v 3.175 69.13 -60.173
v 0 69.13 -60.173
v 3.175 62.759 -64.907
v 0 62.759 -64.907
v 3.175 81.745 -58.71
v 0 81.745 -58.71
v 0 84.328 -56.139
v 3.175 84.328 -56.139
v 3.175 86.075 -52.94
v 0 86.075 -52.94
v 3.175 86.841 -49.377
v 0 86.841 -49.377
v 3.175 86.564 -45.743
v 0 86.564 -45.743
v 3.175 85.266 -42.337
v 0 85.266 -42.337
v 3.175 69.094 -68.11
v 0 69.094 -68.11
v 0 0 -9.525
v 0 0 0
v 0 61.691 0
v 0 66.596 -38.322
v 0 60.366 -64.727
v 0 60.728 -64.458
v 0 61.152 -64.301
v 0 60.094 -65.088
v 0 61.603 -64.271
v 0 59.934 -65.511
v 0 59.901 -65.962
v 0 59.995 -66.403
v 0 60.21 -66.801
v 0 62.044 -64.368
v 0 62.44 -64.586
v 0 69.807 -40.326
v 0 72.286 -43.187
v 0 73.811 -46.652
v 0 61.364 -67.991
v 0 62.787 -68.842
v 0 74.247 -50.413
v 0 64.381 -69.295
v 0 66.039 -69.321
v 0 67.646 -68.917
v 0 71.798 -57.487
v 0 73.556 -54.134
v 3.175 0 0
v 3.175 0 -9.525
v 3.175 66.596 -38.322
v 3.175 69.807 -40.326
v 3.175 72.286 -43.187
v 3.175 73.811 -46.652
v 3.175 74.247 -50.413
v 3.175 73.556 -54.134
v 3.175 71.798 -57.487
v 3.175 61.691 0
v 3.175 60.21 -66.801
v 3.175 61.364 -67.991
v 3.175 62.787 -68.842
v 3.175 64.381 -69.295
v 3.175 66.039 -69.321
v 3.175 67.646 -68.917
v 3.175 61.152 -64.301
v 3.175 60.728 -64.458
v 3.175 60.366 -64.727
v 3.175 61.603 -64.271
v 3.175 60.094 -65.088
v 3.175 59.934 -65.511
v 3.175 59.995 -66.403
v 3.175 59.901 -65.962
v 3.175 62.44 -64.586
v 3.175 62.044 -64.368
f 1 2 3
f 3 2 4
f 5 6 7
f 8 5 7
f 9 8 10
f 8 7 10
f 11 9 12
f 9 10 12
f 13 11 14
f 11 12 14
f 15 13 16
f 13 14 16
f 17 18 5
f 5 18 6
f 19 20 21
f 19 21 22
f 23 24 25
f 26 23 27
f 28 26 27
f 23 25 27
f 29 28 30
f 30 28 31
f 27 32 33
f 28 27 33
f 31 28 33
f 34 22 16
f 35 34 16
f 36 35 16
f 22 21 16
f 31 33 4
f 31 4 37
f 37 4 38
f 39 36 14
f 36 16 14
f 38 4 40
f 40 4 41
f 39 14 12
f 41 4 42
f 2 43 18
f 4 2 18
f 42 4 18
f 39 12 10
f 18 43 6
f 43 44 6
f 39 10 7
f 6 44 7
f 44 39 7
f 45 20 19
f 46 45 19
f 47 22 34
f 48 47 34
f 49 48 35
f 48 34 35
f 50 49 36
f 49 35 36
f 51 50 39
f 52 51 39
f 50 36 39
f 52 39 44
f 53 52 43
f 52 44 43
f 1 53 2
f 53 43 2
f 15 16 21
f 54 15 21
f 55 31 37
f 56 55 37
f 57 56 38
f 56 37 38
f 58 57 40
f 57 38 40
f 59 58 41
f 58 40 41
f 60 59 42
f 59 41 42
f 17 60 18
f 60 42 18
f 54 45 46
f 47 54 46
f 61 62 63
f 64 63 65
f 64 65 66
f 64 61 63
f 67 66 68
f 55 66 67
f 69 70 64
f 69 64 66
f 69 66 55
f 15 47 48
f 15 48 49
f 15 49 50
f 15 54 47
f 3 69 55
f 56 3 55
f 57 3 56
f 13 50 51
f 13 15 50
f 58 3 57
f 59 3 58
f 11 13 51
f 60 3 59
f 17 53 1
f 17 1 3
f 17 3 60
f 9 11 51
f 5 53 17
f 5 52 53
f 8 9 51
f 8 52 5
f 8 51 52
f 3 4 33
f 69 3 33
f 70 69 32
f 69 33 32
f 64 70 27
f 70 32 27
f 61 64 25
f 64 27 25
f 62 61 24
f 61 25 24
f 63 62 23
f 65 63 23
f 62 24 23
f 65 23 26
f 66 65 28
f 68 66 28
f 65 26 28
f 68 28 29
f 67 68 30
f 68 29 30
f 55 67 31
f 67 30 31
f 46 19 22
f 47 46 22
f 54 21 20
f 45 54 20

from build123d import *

# Parameters (mm, degrees)
BOSS_EXTRUDE1_DEPTH = 3.175


with BuildPart() as part:
    # Sketch1 → Boss-Extrude1 (new body)
    with BuildSketch(Plane(origin=(0, 0, 0), x_dir=(0, 0, -1), z_dir=(1, 0, 0))):
        with BuildLine():
            Line((0, 0), (9.525, 0))
            Line((9.525, 0), (38.322191876, 66.595518378))
            ThreePointArc((38.322191876, 66.595518378), (48.515936948, 74.170316159), (60.17277679, 69.129672857))
            Line((60.17277679, 69.129672857), (64.907025403, 62.758582188))
            ThreePointArc((64.907025403, 62.758582188), (64.579656991, 60.537514331), (66.800724848, 60.21014592))
            ThreePointArc((66.800724848, 60.21014592), (69.295454529, 64.381080761), (68.110198493, 69.094417346))
            Line((68.110198493, 69.094417346), (58.709682019, 81.745113939))
            ThreePointArc((58.709682019, 81.745113939), (51.186125331, 86.5864385), (42.337451795, 85.266095591))
            Line((42.337451795, 85.266095591), (0, 61.691247253))
            Line((0, 61.691247253), (0, 0))
        make_face()
    extrude(amount=BOSS_EXTRUDE1_DEPTH)


solid = part.part
